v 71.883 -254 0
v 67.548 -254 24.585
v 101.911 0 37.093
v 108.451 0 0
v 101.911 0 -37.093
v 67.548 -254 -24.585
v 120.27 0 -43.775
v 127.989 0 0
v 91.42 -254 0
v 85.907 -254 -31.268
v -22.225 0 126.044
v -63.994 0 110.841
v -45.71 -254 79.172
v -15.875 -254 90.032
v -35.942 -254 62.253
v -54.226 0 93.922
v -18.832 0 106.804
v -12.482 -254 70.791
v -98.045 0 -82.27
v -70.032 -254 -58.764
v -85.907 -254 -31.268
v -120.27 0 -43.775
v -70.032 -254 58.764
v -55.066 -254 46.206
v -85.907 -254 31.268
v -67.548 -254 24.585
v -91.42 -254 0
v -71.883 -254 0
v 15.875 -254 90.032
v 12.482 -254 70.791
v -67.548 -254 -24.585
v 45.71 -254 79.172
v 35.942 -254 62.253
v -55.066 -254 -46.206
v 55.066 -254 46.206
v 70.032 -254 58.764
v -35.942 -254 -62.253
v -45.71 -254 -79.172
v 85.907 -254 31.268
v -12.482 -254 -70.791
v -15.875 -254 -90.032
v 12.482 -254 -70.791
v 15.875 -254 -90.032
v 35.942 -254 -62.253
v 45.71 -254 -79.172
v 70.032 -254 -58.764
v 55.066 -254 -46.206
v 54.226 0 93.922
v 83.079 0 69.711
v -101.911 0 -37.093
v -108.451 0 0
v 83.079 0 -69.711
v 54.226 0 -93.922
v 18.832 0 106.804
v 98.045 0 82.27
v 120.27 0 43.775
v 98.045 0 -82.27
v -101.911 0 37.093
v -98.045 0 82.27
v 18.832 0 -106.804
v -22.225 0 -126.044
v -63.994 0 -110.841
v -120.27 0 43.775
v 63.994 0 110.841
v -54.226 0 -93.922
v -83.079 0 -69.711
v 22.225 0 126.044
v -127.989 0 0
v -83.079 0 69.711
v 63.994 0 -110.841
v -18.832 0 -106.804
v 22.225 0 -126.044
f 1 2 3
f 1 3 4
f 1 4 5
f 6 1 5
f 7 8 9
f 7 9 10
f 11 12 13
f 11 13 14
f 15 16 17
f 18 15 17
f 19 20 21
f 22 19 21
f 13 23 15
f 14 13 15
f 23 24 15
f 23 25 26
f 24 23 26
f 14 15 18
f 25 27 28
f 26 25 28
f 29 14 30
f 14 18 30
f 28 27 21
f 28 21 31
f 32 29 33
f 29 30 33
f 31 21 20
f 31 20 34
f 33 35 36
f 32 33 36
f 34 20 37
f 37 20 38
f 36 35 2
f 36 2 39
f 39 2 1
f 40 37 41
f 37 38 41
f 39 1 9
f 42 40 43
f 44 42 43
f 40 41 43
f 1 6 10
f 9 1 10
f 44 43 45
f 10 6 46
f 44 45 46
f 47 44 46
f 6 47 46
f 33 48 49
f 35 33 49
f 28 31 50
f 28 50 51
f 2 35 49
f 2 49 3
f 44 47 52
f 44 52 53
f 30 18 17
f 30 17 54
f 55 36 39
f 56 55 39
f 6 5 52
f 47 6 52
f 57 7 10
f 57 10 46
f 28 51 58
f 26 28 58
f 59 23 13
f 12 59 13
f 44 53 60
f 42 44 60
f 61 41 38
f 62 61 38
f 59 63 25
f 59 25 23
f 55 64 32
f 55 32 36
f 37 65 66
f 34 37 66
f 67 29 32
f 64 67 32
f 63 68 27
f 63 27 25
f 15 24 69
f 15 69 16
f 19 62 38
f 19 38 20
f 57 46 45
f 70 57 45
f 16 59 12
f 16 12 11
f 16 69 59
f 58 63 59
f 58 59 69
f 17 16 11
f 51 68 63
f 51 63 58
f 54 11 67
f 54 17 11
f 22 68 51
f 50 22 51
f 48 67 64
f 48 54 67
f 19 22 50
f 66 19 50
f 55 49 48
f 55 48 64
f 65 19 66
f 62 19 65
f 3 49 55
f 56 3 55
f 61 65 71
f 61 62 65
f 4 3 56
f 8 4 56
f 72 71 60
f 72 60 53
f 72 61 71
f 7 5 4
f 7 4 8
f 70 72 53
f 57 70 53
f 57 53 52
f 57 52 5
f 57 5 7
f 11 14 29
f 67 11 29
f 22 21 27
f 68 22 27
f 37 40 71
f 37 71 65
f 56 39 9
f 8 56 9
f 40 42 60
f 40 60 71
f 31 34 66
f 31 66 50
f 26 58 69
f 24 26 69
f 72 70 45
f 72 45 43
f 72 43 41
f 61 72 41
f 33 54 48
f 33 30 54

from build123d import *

# Parameters (mm, degrees)
LOFT1_DEPTH = 254
LOFT1_DRAFT = -8.0697267
SHELL1_T    = -19.05


# Read off the part's stored shape, not the designer's step: Loft1
with BuildPart() as part:
    # Loft1 outline → Loft1 (with draft: the straight prism first)
    with BuildSketch(Plane(origin=(0, -254, 0), x_dir=(1, 0, 0), z_dir=(0, 1, 0))):
        Polygon((45.71024071, -79.172459336), (70.032151779, -58.763952728), (85.907151779, -31.267646158), (91.42048142, 0), (85.907151779, 31.267646158), (70.032151779, 58.763952728), (45.71024071, 79.172459336), (15.875, 90.031598886), (-15.875, 90.031598886), (-45.71024071, 79.172459336), (-70.032151779, 58.763952728), (-85.907151779, 31.267646158), (-91.42048142, 0), (-85.907151779, -31.267646158), (-70.032151779, -58.763952728), (-45.71024071, -79.172459336), (-15.875, -90.031598886), (15.875, -90.031598886), align=None)
    extrude(amount=LOFT1_DEPTH)
    # Loft1: the draft: its side faces are tilted about the plane it starts from
    loft1_sides = [part.faces().sort_by_distance(p)[0] for p in [
        (57.871196245, -127, 68.968206032),
        (77.969651779, -127, 45.015799443),
        (88.6638166, -127, 15.633823079),
        (88.663816599, -127, -15.633823079),
        (77.969651779, -127, -45.015799443),
        (57.871196244, -127, -68.968206032),
        (30.792620355, -127, -84.602029111),
        (0, -127, -90.031598886),
        (-30.792620355, -127, -84.602029111),
        (-57.871196245, -127, -68.968206032),
        (-77.969651779, -127, -45.015799443),
        (-88.6638166, -127, -15.633823079),
        (-88.663816599, -127, 15.633823079),
        (-77.969651779, -127, 45.015799443),
        (-57.871196244, -127, 68.968206032),
        (-30.792620355, -127, 84.602029111),
        (0, -127, 90.031598886),
        (30.792620355, -127, 84.602029111),
    ]]
    draft(loft1_sides, Plane(origin=(0, -254, 0), x_dir=(1, 0, 0), z_dir=(0, 1, 0)), LOFT1_DRAFT)

    # Shell1
    shell1_openings = [part.faces().sort_by_distance(p)[0] for p in [
        (0, 0, 0),
        (0, -254, 0),
    ]]
    offset(amount=SHELL1_T, openings=shell1_openings, kind=Kind.INTERSECTION)


solid = part.part
